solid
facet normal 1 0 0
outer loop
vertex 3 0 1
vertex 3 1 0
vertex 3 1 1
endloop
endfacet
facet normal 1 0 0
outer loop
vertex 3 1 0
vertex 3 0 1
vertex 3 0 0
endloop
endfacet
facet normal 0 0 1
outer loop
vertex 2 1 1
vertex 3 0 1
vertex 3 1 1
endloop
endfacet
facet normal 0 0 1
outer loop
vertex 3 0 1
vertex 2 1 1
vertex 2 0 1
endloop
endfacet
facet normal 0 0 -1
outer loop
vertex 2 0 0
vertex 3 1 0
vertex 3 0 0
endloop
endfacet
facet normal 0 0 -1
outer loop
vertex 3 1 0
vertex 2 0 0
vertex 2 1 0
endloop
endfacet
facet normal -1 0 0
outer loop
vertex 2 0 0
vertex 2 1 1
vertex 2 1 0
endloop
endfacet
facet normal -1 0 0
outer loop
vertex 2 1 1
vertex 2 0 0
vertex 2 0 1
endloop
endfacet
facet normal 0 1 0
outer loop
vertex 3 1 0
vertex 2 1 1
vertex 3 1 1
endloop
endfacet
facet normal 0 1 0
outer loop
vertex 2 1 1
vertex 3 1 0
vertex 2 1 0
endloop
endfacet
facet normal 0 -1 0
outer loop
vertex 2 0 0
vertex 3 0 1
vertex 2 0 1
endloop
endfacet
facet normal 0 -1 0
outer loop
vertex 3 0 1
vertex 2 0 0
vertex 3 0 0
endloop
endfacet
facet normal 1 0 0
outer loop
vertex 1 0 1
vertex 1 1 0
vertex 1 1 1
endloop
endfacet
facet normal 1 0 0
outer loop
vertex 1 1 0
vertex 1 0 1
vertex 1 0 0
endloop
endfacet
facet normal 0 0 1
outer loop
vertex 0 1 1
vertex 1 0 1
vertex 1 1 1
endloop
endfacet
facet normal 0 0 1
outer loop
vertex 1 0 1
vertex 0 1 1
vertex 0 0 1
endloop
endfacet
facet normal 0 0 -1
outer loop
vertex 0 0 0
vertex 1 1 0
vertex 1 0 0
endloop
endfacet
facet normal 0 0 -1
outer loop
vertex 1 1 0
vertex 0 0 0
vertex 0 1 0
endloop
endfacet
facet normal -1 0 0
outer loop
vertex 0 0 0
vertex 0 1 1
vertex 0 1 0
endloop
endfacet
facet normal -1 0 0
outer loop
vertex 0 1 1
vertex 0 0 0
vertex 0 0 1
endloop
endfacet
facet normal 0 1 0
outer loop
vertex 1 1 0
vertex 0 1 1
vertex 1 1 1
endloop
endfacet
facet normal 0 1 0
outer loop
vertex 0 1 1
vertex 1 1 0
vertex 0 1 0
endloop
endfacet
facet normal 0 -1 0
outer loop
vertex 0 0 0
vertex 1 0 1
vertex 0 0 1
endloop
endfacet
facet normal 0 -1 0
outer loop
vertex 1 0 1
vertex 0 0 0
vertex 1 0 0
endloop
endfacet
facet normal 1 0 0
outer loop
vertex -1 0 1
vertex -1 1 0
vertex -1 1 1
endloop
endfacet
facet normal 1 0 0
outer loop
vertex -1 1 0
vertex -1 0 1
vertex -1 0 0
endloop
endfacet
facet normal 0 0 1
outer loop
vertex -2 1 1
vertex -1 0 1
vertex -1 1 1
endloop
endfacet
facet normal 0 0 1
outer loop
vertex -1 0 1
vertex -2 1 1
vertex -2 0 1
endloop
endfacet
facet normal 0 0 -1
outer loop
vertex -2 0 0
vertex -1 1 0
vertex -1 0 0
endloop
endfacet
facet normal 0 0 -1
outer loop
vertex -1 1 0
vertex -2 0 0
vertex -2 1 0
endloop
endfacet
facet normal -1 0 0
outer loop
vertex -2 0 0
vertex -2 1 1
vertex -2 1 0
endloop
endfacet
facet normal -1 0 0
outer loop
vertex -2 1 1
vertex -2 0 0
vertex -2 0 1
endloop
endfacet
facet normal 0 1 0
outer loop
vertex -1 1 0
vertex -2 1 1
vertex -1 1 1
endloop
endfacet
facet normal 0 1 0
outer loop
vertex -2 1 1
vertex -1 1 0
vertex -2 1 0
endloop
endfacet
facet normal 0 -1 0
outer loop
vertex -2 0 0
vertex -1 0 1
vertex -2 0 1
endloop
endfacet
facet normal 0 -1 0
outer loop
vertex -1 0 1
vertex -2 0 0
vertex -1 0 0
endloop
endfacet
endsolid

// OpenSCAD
color( [1,0,0] )
   translate( [2, 0, 0] )
      cube( size = [1, 1, 1] );
color( [0,1,0] )
   translate( [00, 0, 0] )
      cube( size = [1, 1, 1] );
color( [0,0,1] )
   translate( [-2, 0, 0] )
      cube( size = [1, 1, 1] );
